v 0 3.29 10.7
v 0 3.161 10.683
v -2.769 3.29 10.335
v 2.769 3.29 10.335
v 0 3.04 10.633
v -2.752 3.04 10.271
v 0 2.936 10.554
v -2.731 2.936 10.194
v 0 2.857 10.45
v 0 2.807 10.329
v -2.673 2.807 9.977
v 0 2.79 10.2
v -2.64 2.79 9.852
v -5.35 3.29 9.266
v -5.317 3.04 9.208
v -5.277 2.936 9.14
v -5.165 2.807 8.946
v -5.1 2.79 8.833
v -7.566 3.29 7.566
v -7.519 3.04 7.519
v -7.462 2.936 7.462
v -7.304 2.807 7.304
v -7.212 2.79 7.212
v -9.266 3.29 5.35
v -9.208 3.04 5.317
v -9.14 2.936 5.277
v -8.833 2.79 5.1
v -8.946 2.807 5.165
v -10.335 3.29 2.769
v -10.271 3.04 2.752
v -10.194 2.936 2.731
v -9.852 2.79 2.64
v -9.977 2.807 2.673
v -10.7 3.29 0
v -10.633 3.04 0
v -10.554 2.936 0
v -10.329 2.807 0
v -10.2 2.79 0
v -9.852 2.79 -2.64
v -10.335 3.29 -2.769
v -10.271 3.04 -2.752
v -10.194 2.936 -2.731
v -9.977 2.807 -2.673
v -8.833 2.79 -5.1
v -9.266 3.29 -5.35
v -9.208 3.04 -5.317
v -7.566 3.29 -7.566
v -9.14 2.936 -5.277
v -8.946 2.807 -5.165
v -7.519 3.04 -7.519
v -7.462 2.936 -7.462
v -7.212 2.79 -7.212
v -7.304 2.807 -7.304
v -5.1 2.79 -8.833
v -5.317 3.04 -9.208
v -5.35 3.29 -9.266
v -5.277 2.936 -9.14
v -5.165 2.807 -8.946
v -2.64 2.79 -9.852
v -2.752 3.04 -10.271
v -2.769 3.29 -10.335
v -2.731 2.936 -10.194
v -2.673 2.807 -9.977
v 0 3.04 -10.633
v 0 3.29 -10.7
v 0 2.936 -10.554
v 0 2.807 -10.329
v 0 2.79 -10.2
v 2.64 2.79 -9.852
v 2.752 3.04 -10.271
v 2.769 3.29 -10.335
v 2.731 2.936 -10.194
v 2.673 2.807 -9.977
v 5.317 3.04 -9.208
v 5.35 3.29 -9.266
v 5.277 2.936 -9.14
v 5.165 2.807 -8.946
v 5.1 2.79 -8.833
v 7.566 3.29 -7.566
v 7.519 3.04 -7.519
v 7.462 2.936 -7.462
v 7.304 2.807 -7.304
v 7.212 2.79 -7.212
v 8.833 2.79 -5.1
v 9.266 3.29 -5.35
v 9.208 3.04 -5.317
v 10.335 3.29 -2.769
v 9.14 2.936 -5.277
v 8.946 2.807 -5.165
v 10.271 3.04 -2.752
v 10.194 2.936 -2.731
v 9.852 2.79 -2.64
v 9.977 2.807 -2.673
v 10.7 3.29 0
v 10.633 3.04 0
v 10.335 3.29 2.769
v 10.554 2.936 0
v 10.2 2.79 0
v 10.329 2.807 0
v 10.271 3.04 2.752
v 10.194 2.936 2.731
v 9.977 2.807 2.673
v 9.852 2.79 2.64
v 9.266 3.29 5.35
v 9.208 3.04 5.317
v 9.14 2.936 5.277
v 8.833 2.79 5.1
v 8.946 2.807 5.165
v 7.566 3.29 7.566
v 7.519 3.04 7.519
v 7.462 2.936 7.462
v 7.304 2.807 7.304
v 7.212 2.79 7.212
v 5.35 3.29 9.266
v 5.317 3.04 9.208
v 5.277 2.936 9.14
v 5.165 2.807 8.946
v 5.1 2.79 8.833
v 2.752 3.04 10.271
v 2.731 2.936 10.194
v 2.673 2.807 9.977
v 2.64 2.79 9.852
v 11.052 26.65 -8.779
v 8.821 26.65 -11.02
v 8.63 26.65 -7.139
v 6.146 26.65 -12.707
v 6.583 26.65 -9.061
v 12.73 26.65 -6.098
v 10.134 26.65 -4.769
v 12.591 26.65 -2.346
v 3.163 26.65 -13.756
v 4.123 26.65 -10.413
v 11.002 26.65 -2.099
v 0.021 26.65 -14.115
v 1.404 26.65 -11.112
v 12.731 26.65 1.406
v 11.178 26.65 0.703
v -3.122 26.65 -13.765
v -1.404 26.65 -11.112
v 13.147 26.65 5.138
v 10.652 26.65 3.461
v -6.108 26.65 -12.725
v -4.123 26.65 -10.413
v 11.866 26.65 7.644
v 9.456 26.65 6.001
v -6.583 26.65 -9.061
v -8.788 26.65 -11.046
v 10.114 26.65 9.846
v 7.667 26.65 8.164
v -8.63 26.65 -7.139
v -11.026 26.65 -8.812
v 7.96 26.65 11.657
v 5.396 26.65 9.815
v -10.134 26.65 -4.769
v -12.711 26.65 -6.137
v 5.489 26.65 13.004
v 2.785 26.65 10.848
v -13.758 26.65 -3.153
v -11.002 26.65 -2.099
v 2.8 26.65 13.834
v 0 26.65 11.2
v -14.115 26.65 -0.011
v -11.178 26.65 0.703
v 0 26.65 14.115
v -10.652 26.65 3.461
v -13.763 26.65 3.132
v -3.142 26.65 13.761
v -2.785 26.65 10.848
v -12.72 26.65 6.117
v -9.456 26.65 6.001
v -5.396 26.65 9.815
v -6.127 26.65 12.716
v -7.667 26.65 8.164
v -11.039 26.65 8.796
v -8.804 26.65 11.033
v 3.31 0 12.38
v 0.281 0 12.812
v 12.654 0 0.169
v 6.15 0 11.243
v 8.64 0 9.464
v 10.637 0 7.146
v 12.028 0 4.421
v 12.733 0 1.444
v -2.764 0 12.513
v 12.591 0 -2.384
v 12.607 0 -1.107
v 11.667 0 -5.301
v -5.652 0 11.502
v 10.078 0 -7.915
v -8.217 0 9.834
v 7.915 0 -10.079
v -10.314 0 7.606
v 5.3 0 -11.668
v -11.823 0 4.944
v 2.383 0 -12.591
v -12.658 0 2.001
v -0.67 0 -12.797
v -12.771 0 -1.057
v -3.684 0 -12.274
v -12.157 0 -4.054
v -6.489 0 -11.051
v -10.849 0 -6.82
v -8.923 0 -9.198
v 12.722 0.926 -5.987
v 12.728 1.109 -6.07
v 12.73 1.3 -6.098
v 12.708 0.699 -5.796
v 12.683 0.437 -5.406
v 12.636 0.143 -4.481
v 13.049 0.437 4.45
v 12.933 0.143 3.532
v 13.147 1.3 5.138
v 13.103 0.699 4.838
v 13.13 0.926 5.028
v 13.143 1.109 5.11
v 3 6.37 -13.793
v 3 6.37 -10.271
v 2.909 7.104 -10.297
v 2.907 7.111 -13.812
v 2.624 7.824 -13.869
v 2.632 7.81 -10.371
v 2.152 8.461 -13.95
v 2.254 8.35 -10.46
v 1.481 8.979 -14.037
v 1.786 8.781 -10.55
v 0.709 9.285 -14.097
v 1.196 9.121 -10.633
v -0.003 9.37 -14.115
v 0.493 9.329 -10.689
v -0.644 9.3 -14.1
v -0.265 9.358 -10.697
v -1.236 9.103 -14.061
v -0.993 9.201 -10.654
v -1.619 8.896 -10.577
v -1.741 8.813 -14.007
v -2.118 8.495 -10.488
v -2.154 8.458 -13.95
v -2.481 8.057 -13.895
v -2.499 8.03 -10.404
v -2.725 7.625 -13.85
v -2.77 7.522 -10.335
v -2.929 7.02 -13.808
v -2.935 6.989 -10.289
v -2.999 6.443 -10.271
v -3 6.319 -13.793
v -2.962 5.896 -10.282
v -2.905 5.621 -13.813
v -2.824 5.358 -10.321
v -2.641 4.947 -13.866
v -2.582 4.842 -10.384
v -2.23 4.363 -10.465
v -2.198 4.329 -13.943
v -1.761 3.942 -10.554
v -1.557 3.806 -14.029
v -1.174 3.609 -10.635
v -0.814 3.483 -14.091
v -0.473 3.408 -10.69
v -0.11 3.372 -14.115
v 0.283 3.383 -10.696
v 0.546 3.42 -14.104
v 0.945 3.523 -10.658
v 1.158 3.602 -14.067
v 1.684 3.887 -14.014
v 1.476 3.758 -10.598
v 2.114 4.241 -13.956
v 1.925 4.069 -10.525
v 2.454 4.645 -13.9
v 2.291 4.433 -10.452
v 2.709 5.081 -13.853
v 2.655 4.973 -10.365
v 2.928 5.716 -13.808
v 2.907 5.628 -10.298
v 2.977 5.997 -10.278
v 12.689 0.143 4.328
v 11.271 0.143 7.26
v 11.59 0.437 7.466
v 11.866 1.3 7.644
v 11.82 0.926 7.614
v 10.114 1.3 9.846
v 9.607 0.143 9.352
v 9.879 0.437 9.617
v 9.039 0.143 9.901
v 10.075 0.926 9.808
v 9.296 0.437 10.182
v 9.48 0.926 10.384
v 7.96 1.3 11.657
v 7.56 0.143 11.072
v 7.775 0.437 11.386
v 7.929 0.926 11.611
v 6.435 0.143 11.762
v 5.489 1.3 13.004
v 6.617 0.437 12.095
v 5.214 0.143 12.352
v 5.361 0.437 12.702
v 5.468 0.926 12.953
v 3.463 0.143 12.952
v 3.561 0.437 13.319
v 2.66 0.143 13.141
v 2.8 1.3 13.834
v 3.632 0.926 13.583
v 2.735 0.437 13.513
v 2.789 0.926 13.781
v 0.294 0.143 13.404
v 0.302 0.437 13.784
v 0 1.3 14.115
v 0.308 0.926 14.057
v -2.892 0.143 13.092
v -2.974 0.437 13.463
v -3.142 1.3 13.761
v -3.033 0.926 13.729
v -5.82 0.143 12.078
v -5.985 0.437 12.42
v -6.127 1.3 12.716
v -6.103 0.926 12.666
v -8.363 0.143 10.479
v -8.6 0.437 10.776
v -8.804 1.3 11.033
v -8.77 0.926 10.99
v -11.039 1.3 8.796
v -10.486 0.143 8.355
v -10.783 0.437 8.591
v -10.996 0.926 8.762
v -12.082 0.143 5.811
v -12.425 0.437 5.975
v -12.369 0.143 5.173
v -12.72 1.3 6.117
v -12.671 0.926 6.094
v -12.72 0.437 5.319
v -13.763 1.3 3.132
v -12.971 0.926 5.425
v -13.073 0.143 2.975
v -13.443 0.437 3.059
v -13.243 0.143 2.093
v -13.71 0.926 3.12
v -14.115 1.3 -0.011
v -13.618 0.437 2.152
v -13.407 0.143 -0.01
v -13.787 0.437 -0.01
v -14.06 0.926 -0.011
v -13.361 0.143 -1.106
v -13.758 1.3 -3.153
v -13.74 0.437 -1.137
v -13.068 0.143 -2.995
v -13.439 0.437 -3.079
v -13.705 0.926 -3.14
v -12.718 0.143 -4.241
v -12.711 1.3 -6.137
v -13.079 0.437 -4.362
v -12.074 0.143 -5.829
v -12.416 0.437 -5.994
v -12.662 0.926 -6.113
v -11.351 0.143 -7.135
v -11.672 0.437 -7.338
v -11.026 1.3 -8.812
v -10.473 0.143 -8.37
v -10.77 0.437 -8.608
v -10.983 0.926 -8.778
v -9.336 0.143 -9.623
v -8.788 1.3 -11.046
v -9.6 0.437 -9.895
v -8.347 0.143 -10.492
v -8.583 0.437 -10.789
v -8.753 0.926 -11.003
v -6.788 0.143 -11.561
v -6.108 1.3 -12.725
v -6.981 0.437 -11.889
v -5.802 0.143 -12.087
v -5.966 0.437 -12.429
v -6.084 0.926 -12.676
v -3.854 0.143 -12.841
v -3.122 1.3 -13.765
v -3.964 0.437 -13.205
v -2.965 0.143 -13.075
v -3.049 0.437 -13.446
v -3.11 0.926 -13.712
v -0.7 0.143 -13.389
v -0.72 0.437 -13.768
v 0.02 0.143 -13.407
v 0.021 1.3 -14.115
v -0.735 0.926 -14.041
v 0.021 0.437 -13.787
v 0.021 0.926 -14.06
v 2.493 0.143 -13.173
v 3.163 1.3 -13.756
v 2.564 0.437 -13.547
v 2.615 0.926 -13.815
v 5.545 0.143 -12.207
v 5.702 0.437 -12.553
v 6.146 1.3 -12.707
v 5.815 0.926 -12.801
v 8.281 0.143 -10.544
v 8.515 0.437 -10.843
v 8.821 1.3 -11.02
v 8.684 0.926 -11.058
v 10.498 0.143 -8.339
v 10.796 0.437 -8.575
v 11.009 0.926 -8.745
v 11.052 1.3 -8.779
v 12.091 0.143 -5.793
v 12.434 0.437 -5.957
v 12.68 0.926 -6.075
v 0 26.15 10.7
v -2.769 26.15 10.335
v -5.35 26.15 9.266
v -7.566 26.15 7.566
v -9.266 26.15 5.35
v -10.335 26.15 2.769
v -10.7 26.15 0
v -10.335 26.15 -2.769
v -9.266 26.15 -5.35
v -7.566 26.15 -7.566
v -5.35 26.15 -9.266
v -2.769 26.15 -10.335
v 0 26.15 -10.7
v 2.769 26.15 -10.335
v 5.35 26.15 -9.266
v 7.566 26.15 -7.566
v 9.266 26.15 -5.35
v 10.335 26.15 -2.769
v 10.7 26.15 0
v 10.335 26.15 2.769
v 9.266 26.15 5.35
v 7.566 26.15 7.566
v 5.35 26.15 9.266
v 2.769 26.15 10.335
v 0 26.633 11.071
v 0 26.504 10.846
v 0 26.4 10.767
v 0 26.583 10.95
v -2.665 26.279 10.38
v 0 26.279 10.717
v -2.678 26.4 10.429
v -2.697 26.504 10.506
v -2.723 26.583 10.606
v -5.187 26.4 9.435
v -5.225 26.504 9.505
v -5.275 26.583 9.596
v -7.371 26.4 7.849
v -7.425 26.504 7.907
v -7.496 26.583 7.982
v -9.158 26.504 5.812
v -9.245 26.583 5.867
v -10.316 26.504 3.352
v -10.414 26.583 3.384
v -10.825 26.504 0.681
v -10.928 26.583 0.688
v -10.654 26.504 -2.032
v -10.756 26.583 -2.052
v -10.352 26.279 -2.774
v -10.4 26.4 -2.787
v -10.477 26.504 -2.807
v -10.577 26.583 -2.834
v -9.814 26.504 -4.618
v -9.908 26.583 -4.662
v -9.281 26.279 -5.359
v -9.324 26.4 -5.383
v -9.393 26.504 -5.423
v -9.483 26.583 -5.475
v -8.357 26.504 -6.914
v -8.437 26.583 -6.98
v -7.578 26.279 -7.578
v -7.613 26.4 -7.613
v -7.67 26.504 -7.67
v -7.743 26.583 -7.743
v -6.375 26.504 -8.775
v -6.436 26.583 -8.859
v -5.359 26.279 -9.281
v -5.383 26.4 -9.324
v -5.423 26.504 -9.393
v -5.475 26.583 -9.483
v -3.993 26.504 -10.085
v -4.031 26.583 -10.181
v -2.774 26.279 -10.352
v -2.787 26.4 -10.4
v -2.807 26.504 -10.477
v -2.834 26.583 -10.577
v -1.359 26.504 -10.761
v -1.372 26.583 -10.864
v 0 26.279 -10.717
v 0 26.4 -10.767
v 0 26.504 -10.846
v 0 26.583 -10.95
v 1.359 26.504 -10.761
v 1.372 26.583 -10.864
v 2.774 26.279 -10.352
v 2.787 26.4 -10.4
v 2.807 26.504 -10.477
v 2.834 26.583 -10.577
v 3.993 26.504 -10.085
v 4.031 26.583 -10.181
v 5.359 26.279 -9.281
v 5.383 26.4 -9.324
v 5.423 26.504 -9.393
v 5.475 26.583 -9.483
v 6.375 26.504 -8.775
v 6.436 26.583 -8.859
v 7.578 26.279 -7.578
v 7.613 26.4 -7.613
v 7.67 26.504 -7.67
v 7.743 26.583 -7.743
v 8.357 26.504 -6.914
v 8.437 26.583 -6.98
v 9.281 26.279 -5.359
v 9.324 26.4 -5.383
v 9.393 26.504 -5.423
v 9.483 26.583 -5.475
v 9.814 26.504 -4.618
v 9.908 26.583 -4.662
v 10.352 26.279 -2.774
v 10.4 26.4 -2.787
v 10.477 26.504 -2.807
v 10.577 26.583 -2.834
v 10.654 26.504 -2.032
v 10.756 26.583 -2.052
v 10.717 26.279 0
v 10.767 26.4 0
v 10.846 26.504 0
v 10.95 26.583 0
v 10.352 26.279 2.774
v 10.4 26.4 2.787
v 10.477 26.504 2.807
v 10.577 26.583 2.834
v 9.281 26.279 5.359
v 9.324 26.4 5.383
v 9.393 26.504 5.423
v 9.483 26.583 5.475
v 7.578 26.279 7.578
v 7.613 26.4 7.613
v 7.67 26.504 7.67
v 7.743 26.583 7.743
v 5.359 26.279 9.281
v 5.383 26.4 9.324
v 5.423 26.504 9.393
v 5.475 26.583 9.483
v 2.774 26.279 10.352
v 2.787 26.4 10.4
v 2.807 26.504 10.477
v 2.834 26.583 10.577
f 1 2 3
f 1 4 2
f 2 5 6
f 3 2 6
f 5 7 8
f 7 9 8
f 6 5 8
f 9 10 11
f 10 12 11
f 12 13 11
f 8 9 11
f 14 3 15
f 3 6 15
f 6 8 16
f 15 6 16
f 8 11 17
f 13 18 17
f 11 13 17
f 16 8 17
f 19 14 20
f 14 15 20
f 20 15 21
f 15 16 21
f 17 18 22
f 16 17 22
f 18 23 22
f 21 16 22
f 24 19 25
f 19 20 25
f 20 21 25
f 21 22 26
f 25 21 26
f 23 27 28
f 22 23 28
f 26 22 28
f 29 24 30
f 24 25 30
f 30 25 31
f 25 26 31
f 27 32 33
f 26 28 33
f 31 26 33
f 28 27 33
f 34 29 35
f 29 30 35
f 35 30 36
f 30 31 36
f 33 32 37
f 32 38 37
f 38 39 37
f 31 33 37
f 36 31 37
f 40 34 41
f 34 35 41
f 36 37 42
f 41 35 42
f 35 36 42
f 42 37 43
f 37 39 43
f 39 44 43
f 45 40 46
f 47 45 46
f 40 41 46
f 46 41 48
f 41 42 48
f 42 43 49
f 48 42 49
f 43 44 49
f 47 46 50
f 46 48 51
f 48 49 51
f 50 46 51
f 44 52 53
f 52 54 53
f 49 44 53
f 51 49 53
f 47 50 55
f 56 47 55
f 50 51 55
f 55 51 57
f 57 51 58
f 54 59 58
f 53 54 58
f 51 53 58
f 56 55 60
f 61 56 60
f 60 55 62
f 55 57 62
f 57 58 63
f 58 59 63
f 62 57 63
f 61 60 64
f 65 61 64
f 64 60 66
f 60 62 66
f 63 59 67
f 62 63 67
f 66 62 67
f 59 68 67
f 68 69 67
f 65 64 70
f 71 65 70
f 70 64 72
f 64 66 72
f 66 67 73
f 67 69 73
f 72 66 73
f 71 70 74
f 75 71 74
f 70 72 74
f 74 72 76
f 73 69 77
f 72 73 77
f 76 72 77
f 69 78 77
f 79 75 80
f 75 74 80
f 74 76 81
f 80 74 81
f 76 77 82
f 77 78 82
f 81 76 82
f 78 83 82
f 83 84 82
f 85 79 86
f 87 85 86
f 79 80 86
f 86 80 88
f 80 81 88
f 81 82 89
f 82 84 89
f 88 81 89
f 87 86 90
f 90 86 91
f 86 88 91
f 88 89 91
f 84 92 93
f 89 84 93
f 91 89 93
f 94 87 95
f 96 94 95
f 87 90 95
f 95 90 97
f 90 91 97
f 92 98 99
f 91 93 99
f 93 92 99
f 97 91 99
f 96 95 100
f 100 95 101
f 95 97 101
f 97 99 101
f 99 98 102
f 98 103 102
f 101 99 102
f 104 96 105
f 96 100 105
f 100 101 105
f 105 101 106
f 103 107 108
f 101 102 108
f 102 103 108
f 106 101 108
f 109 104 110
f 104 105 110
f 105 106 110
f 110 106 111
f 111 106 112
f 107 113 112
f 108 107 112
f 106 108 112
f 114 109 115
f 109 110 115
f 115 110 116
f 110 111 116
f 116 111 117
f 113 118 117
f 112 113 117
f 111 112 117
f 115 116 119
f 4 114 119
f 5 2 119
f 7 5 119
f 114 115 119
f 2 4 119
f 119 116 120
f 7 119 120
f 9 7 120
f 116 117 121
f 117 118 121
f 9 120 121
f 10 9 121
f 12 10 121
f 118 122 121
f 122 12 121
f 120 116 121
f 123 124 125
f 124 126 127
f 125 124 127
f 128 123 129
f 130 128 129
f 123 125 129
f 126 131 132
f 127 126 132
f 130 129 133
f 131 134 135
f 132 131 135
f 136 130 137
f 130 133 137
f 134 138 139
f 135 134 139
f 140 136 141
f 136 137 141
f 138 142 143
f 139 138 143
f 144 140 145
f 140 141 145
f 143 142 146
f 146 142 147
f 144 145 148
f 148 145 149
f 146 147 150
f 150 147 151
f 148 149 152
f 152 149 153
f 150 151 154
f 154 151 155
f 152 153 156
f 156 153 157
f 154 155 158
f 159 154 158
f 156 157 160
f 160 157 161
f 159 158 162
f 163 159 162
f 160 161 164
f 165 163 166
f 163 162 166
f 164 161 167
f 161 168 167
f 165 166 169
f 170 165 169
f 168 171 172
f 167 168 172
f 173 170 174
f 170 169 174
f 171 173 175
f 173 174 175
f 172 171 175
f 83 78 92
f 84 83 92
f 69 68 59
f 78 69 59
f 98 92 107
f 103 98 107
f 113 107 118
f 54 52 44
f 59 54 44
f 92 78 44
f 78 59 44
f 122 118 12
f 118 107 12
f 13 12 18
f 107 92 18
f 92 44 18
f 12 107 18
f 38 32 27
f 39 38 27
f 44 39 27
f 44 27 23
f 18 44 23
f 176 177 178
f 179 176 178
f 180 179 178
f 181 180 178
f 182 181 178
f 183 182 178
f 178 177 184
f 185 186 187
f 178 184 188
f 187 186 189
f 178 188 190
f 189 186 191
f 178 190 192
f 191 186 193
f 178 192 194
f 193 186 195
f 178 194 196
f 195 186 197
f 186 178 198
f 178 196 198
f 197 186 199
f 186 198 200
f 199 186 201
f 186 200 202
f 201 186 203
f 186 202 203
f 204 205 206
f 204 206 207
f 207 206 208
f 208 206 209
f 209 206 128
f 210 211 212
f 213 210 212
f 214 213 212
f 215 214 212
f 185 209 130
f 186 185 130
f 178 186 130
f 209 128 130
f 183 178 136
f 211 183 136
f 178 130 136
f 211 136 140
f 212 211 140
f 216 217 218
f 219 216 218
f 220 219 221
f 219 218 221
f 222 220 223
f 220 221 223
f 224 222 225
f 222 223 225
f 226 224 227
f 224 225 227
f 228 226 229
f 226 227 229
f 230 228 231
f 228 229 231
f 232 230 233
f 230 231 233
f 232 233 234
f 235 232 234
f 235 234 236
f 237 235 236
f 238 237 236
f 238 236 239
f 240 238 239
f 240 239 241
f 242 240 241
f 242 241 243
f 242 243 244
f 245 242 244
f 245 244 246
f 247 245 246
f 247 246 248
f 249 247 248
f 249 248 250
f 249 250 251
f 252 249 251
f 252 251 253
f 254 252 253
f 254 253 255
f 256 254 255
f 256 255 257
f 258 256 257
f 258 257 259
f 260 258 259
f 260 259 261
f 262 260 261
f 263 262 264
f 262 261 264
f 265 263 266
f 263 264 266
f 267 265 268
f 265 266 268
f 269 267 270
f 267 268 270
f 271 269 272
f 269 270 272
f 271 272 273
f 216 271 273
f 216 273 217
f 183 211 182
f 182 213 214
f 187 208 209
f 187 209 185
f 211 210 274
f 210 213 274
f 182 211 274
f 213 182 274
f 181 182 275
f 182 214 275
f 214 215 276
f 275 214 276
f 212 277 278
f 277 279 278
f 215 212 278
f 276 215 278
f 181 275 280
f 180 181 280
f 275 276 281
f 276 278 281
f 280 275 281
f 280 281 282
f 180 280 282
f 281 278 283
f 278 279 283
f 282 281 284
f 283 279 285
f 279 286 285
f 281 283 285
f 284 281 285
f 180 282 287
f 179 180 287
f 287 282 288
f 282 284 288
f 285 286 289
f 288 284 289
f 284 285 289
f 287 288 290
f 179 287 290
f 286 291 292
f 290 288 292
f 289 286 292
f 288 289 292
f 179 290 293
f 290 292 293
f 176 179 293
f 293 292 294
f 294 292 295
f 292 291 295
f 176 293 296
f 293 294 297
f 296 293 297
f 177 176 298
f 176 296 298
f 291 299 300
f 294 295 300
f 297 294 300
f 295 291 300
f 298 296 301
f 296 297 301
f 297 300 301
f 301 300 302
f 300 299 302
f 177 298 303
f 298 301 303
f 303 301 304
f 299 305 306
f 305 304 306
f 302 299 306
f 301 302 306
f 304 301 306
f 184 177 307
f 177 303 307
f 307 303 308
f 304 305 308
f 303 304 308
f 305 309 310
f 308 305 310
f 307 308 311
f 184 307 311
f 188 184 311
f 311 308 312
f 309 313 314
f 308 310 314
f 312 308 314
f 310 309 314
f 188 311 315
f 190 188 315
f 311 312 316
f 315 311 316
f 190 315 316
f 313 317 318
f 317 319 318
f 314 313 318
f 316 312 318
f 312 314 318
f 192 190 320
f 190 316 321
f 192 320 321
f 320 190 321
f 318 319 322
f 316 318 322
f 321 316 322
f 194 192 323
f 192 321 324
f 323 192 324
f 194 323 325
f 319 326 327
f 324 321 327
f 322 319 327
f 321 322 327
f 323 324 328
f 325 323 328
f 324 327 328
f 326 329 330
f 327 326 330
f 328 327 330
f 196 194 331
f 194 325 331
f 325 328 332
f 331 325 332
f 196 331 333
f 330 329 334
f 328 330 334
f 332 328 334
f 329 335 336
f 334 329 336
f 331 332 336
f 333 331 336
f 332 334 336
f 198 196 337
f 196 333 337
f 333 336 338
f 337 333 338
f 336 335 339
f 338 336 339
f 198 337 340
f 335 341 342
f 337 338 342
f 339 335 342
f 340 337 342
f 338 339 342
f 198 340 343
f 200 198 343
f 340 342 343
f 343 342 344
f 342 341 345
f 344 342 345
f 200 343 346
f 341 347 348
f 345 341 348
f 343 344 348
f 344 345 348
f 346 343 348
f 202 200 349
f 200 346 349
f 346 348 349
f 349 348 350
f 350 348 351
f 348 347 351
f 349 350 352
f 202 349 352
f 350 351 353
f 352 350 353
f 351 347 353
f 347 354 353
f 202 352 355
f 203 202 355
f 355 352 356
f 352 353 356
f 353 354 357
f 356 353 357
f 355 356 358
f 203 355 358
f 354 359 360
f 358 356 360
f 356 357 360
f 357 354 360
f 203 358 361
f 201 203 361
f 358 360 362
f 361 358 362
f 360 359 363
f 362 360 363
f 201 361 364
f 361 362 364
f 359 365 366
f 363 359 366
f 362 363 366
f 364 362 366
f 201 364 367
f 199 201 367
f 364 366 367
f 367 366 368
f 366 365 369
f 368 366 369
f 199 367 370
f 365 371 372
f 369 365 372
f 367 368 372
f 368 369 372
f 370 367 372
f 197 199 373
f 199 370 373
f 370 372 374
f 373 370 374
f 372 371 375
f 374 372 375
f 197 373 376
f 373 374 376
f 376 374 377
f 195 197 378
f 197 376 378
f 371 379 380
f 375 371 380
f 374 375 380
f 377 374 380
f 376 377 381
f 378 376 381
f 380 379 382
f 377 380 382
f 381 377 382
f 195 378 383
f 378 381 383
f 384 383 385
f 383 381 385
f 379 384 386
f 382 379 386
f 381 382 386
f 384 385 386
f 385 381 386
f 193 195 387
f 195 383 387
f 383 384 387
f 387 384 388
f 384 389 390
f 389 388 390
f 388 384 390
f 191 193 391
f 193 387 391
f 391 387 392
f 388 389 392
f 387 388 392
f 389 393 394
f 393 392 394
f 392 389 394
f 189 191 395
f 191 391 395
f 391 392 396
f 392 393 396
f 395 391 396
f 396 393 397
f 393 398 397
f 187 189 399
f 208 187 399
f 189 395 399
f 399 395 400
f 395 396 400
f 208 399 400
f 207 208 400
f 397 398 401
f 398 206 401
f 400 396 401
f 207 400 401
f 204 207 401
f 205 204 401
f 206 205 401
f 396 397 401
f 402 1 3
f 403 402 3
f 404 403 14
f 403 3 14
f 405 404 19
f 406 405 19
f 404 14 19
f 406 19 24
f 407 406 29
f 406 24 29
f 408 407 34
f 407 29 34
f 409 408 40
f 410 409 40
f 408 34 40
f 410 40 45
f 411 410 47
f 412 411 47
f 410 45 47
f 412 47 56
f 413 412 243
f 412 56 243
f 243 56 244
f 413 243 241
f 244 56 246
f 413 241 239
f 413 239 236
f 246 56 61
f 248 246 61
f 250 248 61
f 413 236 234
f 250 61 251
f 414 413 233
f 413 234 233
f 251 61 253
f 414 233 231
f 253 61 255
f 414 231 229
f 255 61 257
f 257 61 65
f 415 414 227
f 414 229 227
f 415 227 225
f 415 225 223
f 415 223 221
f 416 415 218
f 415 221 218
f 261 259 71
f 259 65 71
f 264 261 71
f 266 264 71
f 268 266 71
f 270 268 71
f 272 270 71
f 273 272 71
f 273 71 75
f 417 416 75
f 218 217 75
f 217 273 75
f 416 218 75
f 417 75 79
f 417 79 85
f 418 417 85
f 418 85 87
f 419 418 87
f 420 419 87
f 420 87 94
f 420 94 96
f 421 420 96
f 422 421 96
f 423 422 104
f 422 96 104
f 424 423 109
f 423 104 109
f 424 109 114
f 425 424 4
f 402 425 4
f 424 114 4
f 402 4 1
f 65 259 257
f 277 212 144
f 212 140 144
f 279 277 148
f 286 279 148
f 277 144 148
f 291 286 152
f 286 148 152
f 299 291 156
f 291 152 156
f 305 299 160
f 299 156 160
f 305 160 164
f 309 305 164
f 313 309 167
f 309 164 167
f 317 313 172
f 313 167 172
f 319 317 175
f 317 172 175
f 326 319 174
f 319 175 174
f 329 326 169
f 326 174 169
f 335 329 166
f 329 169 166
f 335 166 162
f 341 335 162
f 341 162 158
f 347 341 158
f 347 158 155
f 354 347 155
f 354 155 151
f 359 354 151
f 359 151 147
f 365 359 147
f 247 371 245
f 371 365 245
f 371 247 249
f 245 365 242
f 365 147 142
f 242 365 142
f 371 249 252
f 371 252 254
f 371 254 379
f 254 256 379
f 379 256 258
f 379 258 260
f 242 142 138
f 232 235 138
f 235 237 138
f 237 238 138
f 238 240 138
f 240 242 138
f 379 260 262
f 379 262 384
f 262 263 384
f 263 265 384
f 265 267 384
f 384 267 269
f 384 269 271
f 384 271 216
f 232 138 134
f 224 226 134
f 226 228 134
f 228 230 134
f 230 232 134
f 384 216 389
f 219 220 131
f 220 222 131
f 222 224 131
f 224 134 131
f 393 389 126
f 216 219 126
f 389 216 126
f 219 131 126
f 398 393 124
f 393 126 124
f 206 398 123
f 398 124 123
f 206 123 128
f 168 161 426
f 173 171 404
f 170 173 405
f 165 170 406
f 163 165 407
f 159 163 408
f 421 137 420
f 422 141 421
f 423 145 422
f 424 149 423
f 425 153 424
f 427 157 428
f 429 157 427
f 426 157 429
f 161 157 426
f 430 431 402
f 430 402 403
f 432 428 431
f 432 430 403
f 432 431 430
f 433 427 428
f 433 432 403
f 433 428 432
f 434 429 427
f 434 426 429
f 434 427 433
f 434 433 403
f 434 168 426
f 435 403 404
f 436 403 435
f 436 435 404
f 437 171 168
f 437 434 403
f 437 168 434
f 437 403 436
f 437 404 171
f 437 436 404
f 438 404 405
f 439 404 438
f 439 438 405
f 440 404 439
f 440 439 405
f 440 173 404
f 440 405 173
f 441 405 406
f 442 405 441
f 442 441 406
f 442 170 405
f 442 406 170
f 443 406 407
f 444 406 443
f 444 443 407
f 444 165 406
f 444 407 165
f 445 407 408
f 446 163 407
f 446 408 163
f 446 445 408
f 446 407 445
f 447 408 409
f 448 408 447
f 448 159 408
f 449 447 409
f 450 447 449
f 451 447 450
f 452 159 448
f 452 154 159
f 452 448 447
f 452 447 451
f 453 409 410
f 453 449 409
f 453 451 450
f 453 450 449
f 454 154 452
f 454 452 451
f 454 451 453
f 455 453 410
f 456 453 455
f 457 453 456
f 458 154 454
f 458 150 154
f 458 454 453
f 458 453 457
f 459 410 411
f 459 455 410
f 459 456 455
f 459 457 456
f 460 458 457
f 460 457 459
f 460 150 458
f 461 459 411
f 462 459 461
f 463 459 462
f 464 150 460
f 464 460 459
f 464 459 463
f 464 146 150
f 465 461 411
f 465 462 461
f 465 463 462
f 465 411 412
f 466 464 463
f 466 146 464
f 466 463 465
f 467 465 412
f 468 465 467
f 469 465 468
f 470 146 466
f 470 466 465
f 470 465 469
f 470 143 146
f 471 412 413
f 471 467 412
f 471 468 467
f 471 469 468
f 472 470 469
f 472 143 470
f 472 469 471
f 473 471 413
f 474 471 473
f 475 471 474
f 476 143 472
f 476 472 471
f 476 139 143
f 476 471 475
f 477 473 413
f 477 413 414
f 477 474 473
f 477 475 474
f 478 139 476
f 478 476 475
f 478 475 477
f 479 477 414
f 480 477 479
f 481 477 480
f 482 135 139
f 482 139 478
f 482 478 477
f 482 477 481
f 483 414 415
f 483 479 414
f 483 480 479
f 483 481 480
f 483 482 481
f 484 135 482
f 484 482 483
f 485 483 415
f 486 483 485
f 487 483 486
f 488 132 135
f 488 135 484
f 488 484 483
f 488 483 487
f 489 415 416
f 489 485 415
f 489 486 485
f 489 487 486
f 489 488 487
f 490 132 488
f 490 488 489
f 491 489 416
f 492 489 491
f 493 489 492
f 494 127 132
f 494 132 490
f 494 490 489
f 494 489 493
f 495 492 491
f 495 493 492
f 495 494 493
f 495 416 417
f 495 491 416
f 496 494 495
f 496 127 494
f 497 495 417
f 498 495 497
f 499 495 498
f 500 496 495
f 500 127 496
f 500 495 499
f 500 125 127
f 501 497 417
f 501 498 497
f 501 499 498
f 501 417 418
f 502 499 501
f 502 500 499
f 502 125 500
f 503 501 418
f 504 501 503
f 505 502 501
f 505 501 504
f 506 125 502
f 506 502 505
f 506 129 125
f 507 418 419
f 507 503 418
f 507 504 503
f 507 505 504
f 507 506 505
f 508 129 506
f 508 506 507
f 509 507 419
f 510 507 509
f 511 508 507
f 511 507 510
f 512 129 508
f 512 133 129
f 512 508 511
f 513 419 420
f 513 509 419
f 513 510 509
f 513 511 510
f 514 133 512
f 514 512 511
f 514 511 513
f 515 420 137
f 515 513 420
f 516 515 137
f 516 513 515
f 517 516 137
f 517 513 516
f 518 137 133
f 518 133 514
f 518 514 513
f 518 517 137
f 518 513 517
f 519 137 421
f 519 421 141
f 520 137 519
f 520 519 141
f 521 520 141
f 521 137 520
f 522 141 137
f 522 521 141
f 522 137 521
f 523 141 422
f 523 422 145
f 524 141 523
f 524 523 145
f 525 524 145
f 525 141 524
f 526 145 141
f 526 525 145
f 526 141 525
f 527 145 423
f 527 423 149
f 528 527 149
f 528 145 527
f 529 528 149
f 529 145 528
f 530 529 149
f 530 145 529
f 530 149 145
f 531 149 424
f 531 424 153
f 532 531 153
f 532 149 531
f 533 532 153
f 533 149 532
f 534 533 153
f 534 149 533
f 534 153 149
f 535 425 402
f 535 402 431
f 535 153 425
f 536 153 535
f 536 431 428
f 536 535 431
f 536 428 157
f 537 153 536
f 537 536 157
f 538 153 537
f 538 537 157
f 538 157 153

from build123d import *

# Parameters (mm, degrees)
FILLET1_R          = 1.3
SKETCH3_R          = 3
CUT_EXTRUDE1_DEPTH = 20
FILLET3_R          = 0.5
FILLET4_R          = 0.5
CAVITY1_OUTLINE_W  = 50.8
CAVITY1_OUTLINE_H  = 26.650011625


# Read off the part's stored shape, not the designer's step: Cavity1
with BuildPart() as part:
    # Sketch2 → Revolve1 (revolve)
    with BuildSketch(Plane(origin=(0, 0, 0), x_dir=(0, 0, -1), z_dir=(1, 0, 0)), mode=Mode.PRIVATE) as revolve1_sk:
        Polygon((0, 0), (14.115, 0), (14.115, 26.65), (10.7, 26.65), (10.7, 2.79), (0, 2.79), align=None)
    revolve(revolve1_sk.sketch.rotate(Axis((0, 29.213224894, 0), (0, -1, 0)), 180), axis=Axis((0, 29.213224894, 0), (0, -1, 0)))

    # Fillet1
    fillet1_edges = [part.edges().sort_by_distance(p)[0] for p in [
        (0, 0, -14.115),
    ]]
    fillet(fillet1_edges, radius=FILLET1_R)

    # Sketch3 → Cut-Extrude1 (cut)
    with BuildSketch(Plane.XY):
        with Locations((0, 6.37)):
            Circle(SKETCH3_R)
    extrude(amount=-CUT_EXTRUDE1_DEPTH, mode=Mode.SUBTRACT)

    # Fillet3
    fillet3_edges = [part.edges().sort_by_distance(p)[0] for p in [
        (0, 2.79, -10.7),
    ]]
    fillet(fillet3_edges, radius=FILLET3_R)

    # Fillet4
    fillet4_edges = [part.edges().sort_by_distance(p)[0] for p in [
        (0, 26.65, -10.7),
    ]]
    fillet(fillet4_edges, radius=FILLET4_R)

    # Cavity1 outline → Cavity1 (revolve, cut)
    with BuildSketch(Plane(origin=(63.391344809, 0, -2.353004111), x_dir=(1, 0, 0), z_dir=(0, 0, 1))):
        with Locations((25.4, 13.324994188)):
            Rectangle(CAVITY1_OUTLINE_W, CAVITY1_OUTLINE_H)
    revolve(axis=Axis((63.391344809, 0, -2.353004111), (0, 1, 0)), mode=Mode.SUBTRACT)


solid = part.part
